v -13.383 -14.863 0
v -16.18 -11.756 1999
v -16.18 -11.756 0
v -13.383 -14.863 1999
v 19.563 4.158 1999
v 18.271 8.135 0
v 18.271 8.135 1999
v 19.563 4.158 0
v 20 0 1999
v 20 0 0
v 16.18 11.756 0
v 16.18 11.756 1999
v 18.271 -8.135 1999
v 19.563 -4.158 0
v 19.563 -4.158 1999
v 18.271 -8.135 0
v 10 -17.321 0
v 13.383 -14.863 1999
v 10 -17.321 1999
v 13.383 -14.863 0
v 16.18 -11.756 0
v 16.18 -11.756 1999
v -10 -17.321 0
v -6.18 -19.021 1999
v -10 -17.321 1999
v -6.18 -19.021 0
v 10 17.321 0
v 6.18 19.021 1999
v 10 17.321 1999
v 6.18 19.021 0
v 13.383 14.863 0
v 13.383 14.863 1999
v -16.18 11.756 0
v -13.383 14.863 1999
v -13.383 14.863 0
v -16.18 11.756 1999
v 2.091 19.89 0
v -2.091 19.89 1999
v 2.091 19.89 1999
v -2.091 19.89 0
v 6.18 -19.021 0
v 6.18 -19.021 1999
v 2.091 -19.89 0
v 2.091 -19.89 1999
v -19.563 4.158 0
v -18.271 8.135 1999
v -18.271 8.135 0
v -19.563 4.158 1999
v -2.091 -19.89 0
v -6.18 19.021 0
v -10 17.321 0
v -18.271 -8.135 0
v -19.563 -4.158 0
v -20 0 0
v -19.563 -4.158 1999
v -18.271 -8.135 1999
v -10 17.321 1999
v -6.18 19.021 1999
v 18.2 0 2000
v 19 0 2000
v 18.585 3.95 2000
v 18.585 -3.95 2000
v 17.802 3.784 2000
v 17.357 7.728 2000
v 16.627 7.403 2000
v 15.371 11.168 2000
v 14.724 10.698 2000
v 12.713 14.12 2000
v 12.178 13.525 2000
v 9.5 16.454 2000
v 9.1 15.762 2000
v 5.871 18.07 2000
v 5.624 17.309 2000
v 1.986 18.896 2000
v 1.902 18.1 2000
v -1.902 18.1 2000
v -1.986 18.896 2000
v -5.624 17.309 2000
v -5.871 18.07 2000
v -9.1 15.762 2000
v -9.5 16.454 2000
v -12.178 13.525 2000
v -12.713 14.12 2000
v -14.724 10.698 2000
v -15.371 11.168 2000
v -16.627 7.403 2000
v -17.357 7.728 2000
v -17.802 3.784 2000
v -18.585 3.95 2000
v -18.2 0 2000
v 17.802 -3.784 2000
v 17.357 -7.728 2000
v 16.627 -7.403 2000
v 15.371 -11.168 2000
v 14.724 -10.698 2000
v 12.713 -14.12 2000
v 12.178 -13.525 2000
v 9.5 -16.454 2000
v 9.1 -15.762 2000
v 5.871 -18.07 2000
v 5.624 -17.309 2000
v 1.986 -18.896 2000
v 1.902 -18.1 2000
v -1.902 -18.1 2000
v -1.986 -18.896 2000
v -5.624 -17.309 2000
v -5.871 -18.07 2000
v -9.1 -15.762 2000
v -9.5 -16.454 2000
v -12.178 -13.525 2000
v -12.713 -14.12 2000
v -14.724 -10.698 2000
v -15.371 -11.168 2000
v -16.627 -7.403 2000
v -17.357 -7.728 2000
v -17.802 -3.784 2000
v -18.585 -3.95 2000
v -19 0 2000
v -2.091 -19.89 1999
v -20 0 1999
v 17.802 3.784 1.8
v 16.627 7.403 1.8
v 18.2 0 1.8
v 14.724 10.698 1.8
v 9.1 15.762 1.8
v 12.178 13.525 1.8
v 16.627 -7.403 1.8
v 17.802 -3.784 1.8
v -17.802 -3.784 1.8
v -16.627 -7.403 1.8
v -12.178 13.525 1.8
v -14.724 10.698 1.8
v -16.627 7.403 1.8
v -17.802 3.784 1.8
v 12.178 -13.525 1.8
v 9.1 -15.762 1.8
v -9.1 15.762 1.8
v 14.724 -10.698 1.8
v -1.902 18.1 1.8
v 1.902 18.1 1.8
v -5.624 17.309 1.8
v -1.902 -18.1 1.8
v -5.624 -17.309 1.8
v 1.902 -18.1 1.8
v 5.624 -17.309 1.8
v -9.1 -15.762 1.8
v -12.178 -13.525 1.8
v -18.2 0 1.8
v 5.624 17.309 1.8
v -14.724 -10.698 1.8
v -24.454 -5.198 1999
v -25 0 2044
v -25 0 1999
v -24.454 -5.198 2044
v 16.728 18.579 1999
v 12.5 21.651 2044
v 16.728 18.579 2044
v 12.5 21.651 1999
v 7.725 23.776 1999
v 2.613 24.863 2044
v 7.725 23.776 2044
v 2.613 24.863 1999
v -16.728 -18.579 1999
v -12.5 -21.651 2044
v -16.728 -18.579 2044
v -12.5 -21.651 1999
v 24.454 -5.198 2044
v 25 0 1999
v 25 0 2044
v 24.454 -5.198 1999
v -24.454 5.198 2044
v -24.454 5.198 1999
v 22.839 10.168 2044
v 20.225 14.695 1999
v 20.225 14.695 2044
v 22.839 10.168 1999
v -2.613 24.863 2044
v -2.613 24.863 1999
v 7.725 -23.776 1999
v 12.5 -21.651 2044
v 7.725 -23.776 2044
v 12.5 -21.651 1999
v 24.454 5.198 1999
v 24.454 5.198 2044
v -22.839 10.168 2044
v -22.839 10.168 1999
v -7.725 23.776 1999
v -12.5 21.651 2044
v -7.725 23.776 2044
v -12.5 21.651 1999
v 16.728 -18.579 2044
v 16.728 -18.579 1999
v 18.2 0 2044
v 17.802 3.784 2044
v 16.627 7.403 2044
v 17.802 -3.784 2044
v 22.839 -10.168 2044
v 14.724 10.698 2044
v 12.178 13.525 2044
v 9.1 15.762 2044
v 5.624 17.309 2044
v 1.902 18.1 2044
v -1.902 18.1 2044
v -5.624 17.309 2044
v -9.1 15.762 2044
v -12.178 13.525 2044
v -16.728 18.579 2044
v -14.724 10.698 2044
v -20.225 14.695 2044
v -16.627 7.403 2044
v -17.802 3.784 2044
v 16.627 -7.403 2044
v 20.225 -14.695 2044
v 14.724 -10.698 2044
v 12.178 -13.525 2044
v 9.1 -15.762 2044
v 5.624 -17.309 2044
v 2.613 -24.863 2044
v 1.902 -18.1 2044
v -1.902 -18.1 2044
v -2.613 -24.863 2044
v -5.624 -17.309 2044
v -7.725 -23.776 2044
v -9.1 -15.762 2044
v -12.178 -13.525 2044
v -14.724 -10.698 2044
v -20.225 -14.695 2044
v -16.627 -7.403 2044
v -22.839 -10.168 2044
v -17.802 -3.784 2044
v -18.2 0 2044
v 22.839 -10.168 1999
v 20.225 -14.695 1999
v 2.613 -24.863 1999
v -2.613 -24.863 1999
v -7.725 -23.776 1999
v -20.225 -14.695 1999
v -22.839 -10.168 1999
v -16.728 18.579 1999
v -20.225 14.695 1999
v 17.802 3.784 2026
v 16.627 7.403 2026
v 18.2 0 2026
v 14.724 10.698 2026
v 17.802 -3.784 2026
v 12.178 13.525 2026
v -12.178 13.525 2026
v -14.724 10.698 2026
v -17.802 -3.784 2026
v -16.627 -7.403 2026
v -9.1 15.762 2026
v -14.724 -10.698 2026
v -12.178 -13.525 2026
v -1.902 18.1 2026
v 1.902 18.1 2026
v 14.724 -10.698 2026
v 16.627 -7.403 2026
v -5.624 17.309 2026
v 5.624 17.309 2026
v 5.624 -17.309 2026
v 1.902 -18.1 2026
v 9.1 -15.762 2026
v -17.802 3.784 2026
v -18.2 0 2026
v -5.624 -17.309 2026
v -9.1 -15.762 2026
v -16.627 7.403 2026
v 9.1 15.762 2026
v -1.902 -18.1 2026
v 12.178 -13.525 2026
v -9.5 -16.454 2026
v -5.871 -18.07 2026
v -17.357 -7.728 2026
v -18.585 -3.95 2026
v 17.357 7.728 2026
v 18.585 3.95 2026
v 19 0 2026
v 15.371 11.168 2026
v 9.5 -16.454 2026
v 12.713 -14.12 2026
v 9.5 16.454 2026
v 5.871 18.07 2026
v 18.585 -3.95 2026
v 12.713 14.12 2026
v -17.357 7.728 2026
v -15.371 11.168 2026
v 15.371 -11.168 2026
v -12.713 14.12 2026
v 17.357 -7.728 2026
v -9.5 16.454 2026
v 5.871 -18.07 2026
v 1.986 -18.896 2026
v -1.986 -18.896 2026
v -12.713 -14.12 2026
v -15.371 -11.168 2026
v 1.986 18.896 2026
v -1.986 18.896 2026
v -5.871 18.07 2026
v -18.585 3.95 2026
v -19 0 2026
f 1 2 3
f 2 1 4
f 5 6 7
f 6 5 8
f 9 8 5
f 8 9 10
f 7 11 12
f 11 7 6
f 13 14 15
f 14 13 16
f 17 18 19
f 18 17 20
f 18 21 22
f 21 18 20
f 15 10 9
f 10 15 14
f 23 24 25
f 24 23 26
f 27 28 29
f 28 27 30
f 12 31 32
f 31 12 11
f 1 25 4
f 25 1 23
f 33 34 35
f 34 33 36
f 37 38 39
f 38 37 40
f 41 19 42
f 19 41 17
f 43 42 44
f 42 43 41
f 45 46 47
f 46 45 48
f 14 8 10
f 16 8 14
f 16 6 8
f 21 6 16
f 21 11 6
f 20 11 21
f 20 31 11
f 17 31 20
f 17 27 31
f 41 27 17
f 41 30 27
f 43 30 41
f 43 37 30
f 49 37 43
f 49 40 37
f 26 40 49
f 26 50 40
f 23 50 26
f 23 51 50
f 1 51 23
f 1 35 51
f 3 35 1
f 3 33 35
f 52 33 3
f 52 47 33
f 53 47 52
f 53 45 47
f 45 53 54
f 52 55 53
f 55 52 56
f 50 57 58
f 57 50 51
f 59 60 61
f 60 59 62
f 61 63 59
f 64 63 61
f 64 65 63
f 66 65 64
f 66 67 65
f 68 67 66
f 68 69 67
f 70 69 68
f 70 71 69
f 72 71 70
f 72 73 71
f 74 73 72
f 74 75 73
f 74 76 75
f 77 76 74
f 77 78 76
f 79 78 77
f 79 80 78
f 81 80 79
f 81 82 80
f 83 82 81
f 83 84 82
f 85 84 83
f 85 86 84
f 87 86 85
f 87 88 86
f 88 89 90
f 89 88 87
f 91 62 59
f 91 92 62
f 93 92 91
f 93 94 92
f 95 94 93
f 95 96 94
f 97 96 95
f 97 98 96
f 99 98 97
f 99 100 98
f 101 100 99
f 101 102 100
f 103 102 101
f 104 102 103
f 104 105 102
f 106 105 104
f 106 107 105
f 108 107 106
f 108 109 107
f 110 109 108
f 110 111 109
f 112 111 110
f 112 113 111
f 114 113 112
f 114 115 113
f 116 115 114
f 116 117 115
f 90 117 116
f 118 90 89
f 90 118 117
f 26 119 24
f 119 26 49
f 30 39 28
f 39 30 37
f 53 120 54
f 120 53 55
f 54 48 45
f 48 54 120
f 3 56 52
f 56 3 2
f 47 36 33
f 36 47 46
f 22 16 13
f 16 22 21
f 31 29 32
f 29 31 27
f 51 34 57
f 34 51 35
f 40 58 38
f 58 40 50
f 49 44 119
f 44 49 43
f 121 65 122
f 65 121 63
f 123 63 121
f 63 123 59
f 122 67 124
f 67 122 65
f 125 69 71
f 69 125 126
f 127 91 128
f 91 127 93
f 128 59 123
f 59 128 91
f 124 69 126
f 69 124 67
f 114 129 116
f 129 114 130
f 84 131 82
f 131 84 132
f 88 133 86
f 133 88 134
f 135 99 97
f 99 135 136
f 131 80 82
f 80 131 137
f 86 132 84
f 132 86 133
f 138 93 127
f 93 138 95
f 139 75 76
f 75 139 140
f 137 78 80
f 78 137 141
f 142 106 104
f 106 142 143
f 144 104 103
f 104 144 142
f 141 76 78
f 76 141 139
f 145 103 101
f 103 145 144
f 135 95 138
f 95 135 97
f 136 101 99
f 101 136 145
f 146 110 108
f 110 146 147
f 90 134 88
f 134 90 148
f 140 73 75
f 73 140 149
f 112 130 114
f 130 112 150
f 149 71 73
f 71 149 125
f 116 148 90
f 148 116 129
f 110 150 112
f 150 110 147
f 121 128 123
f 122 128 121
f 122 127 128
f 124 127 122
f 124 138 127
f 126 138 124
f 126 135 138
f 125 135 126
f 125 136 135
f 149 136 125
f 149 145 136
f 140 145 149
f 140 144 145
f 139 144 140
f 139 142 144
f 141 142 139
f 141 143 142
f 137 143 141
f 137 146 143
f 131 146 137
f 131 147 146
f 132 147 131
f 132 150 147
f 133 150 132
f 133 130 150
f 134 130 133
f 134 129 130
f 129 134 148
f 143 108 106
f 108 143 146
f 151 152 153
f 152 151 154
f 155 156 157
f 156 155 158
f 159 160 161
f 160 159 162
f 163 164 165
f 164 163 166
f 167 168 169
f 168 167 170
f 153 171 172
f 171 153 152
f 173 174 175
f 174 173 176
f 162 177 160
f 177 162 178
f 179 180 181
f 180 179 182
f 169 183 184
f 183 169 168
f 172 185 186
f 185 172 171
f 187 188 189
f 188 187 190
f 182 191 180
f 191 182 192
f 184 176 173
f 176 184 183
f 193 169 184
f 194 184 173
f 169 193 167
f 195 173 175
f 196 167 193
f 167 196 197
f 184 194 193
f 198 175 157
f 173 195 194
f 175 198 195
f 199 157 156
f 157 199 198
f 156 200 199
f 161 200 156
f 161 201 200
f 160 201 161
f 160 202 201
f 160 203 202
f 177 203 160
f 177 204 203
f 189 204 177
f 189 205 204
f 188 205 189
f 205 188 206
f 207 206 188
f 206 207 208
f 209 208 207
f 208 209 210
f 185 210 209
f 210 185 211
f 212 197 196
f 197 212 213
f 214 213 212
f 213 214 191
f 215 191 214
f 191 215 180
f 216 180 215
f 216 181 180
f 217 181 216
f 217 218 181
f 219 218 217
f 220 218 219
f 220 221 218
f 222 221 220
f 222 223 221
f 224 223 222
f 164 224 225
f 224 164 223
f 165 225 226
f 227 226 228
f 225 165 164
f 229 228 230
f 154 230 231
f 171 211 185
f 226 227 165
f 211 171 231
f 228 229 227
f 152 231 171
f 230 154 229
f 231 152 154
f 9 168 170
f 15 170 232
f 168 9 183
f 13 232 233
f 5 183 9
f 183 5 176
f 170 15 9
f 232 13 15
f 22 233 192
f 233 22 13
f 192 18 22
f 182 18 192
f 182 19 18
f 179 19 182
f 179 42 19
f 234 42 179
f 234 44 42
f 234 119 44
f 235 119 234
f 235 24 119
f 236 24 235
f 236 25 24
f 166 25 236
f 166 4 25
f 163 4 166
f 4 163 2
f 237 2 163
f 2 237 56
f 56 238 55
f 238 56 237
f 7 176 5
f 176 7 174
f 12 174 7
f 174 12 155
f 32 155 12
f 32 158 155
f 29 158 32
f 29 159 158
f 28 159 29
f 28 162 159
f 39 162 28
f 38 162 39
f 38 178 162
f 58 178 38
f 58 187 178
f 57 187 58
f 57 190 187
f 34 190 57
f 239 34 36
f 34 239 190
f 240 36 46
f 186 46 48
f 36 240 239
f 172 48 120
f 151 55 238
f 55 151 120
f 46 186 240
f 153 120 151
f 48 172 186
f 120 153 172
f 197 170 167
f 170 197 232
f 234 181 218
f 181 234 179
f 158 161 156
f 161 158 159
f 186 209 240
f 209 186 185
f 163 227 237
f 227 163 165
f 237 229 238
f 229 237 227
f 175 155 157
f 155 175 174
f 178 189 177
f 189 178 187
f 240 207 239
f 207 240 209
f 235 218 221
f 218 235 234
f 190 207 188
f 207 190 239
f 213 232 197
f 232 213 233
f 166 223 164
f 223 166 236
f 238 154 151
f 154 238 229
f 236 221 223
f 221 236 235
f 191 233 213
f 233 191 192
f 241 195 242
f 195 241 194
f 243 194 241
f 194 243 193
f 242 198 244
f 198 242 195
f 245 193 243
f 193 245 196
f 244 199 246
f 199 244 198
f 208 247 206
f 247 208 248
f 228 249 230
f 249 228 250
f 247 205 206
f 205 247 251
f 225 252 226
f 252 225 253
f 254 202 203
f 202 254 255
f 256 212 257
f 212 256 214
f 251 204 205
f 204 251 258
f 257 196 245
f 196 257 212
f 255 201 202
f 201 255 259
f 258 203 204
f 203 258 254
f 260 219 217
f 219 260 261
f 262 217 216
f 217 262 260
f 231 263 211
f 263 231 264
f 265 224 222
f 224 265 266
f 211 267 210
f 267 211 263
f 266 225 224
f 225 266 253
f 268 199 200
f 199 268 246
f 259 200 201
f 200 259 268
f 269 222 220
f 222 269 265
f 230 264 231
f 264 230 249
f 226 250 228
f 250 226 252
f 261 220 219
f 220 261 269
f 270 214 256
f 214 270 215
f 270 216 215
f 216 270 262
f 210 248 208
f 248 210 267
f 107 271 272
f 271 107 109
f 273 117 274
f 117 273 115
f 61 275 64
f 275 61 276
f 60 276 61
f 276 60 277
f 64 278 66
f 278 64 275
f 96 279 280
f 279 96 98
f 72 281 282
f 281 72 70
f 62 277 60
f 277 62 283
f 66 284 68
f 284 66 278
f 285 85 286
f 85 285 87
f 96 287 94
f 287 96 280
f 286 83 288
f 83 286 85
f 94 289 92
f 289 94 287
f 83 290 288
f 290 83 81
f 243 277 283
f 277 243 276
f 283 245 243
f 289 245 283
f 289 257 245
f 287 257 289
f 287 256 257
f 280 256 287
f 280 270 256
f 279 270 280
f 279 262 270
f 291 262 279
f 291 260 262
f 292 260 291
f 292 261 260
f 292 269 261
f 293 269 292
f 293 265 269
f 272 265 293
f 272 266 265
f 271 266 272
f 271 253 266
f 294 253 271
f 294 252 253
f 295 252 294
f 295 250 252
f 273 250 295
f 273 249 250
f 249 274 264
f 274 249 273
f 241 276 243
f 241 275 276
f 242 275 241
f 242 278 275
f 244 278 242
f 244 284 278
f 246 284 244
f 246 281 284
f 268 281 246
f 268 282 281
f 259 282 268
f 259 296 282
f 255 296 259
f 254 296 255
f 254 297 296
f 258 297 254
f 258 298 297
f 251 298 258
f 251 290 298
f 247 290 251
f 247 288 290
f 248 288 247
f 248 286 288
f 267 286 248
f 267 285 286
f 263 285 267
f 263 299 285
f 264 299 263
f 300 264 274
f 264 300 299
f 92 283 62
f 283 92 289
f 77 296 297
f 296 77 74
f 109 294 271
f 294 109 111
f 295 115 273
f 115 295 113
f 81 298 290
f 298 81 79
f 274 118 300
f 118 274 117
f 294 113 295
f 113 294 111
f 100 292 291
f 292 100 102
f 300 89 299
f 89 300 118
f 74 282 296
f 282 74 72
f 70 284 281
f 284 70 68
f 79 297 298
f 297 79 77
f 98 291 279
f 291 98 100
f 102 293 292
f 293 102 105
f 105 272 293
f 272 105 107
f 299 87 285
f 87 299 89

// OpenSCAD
// Parameters
pipe_standard = 1; //[1:1:1]
nominal_size = 40; //[20:80:1]
length_mm = 2000; //[1000:4000:10]
pipe_od = 40; //[30:80:0.5]
pipe_wall = 1.8; //[1:4:0.1]
end_fitting_length = 45; //[25:90:1]
end_fitting_od_scale = 1.25; //[1.05:1.6:0.01]
end_fitting_wall_extra = 0.8; //[0:3:0.1]
include_end_fitting = 1; //[0:1:1]
overlap = 1; //[0.5:2:0.1]

// HT Pipe - complete geometry
module ht_pipe() {
  color([0.85, 0.85, 0.8]) {
    // Pipe body
    difference() {
      cylinder(h=length_mm, r=pipe_od/2, center=false);
      translate([0, 0, pipe_wall])
        cylinder(h=length_mm - pipe_wall, r=pipe_od/2 - pipe_wall, center=false);
    }
    
    // End fitting
    if (include_end_fitting) {
      translate([0, 0, length_mm - overlap]) {
        difference() {
          cylinder(h=end_fitting_length, r=(pipe_od * end_fitting_od_scale) / 2, center=false);
          translate([0, 0, 0])
            cylinder(h=end_fitting_length + overlap, r=pipe_od/2 - pipe_wall, center=false);
          translate([0, 0, 0])
            cylinder(h=end_fitting_length * 0.6, r=(pipe_od/2 - pipe_wall) + end_fitting_wall_extra, center=false);
        }
      }
    }
  }
}

// Assembly
module assembly() {
  ht_pipe();
}

assembly();
